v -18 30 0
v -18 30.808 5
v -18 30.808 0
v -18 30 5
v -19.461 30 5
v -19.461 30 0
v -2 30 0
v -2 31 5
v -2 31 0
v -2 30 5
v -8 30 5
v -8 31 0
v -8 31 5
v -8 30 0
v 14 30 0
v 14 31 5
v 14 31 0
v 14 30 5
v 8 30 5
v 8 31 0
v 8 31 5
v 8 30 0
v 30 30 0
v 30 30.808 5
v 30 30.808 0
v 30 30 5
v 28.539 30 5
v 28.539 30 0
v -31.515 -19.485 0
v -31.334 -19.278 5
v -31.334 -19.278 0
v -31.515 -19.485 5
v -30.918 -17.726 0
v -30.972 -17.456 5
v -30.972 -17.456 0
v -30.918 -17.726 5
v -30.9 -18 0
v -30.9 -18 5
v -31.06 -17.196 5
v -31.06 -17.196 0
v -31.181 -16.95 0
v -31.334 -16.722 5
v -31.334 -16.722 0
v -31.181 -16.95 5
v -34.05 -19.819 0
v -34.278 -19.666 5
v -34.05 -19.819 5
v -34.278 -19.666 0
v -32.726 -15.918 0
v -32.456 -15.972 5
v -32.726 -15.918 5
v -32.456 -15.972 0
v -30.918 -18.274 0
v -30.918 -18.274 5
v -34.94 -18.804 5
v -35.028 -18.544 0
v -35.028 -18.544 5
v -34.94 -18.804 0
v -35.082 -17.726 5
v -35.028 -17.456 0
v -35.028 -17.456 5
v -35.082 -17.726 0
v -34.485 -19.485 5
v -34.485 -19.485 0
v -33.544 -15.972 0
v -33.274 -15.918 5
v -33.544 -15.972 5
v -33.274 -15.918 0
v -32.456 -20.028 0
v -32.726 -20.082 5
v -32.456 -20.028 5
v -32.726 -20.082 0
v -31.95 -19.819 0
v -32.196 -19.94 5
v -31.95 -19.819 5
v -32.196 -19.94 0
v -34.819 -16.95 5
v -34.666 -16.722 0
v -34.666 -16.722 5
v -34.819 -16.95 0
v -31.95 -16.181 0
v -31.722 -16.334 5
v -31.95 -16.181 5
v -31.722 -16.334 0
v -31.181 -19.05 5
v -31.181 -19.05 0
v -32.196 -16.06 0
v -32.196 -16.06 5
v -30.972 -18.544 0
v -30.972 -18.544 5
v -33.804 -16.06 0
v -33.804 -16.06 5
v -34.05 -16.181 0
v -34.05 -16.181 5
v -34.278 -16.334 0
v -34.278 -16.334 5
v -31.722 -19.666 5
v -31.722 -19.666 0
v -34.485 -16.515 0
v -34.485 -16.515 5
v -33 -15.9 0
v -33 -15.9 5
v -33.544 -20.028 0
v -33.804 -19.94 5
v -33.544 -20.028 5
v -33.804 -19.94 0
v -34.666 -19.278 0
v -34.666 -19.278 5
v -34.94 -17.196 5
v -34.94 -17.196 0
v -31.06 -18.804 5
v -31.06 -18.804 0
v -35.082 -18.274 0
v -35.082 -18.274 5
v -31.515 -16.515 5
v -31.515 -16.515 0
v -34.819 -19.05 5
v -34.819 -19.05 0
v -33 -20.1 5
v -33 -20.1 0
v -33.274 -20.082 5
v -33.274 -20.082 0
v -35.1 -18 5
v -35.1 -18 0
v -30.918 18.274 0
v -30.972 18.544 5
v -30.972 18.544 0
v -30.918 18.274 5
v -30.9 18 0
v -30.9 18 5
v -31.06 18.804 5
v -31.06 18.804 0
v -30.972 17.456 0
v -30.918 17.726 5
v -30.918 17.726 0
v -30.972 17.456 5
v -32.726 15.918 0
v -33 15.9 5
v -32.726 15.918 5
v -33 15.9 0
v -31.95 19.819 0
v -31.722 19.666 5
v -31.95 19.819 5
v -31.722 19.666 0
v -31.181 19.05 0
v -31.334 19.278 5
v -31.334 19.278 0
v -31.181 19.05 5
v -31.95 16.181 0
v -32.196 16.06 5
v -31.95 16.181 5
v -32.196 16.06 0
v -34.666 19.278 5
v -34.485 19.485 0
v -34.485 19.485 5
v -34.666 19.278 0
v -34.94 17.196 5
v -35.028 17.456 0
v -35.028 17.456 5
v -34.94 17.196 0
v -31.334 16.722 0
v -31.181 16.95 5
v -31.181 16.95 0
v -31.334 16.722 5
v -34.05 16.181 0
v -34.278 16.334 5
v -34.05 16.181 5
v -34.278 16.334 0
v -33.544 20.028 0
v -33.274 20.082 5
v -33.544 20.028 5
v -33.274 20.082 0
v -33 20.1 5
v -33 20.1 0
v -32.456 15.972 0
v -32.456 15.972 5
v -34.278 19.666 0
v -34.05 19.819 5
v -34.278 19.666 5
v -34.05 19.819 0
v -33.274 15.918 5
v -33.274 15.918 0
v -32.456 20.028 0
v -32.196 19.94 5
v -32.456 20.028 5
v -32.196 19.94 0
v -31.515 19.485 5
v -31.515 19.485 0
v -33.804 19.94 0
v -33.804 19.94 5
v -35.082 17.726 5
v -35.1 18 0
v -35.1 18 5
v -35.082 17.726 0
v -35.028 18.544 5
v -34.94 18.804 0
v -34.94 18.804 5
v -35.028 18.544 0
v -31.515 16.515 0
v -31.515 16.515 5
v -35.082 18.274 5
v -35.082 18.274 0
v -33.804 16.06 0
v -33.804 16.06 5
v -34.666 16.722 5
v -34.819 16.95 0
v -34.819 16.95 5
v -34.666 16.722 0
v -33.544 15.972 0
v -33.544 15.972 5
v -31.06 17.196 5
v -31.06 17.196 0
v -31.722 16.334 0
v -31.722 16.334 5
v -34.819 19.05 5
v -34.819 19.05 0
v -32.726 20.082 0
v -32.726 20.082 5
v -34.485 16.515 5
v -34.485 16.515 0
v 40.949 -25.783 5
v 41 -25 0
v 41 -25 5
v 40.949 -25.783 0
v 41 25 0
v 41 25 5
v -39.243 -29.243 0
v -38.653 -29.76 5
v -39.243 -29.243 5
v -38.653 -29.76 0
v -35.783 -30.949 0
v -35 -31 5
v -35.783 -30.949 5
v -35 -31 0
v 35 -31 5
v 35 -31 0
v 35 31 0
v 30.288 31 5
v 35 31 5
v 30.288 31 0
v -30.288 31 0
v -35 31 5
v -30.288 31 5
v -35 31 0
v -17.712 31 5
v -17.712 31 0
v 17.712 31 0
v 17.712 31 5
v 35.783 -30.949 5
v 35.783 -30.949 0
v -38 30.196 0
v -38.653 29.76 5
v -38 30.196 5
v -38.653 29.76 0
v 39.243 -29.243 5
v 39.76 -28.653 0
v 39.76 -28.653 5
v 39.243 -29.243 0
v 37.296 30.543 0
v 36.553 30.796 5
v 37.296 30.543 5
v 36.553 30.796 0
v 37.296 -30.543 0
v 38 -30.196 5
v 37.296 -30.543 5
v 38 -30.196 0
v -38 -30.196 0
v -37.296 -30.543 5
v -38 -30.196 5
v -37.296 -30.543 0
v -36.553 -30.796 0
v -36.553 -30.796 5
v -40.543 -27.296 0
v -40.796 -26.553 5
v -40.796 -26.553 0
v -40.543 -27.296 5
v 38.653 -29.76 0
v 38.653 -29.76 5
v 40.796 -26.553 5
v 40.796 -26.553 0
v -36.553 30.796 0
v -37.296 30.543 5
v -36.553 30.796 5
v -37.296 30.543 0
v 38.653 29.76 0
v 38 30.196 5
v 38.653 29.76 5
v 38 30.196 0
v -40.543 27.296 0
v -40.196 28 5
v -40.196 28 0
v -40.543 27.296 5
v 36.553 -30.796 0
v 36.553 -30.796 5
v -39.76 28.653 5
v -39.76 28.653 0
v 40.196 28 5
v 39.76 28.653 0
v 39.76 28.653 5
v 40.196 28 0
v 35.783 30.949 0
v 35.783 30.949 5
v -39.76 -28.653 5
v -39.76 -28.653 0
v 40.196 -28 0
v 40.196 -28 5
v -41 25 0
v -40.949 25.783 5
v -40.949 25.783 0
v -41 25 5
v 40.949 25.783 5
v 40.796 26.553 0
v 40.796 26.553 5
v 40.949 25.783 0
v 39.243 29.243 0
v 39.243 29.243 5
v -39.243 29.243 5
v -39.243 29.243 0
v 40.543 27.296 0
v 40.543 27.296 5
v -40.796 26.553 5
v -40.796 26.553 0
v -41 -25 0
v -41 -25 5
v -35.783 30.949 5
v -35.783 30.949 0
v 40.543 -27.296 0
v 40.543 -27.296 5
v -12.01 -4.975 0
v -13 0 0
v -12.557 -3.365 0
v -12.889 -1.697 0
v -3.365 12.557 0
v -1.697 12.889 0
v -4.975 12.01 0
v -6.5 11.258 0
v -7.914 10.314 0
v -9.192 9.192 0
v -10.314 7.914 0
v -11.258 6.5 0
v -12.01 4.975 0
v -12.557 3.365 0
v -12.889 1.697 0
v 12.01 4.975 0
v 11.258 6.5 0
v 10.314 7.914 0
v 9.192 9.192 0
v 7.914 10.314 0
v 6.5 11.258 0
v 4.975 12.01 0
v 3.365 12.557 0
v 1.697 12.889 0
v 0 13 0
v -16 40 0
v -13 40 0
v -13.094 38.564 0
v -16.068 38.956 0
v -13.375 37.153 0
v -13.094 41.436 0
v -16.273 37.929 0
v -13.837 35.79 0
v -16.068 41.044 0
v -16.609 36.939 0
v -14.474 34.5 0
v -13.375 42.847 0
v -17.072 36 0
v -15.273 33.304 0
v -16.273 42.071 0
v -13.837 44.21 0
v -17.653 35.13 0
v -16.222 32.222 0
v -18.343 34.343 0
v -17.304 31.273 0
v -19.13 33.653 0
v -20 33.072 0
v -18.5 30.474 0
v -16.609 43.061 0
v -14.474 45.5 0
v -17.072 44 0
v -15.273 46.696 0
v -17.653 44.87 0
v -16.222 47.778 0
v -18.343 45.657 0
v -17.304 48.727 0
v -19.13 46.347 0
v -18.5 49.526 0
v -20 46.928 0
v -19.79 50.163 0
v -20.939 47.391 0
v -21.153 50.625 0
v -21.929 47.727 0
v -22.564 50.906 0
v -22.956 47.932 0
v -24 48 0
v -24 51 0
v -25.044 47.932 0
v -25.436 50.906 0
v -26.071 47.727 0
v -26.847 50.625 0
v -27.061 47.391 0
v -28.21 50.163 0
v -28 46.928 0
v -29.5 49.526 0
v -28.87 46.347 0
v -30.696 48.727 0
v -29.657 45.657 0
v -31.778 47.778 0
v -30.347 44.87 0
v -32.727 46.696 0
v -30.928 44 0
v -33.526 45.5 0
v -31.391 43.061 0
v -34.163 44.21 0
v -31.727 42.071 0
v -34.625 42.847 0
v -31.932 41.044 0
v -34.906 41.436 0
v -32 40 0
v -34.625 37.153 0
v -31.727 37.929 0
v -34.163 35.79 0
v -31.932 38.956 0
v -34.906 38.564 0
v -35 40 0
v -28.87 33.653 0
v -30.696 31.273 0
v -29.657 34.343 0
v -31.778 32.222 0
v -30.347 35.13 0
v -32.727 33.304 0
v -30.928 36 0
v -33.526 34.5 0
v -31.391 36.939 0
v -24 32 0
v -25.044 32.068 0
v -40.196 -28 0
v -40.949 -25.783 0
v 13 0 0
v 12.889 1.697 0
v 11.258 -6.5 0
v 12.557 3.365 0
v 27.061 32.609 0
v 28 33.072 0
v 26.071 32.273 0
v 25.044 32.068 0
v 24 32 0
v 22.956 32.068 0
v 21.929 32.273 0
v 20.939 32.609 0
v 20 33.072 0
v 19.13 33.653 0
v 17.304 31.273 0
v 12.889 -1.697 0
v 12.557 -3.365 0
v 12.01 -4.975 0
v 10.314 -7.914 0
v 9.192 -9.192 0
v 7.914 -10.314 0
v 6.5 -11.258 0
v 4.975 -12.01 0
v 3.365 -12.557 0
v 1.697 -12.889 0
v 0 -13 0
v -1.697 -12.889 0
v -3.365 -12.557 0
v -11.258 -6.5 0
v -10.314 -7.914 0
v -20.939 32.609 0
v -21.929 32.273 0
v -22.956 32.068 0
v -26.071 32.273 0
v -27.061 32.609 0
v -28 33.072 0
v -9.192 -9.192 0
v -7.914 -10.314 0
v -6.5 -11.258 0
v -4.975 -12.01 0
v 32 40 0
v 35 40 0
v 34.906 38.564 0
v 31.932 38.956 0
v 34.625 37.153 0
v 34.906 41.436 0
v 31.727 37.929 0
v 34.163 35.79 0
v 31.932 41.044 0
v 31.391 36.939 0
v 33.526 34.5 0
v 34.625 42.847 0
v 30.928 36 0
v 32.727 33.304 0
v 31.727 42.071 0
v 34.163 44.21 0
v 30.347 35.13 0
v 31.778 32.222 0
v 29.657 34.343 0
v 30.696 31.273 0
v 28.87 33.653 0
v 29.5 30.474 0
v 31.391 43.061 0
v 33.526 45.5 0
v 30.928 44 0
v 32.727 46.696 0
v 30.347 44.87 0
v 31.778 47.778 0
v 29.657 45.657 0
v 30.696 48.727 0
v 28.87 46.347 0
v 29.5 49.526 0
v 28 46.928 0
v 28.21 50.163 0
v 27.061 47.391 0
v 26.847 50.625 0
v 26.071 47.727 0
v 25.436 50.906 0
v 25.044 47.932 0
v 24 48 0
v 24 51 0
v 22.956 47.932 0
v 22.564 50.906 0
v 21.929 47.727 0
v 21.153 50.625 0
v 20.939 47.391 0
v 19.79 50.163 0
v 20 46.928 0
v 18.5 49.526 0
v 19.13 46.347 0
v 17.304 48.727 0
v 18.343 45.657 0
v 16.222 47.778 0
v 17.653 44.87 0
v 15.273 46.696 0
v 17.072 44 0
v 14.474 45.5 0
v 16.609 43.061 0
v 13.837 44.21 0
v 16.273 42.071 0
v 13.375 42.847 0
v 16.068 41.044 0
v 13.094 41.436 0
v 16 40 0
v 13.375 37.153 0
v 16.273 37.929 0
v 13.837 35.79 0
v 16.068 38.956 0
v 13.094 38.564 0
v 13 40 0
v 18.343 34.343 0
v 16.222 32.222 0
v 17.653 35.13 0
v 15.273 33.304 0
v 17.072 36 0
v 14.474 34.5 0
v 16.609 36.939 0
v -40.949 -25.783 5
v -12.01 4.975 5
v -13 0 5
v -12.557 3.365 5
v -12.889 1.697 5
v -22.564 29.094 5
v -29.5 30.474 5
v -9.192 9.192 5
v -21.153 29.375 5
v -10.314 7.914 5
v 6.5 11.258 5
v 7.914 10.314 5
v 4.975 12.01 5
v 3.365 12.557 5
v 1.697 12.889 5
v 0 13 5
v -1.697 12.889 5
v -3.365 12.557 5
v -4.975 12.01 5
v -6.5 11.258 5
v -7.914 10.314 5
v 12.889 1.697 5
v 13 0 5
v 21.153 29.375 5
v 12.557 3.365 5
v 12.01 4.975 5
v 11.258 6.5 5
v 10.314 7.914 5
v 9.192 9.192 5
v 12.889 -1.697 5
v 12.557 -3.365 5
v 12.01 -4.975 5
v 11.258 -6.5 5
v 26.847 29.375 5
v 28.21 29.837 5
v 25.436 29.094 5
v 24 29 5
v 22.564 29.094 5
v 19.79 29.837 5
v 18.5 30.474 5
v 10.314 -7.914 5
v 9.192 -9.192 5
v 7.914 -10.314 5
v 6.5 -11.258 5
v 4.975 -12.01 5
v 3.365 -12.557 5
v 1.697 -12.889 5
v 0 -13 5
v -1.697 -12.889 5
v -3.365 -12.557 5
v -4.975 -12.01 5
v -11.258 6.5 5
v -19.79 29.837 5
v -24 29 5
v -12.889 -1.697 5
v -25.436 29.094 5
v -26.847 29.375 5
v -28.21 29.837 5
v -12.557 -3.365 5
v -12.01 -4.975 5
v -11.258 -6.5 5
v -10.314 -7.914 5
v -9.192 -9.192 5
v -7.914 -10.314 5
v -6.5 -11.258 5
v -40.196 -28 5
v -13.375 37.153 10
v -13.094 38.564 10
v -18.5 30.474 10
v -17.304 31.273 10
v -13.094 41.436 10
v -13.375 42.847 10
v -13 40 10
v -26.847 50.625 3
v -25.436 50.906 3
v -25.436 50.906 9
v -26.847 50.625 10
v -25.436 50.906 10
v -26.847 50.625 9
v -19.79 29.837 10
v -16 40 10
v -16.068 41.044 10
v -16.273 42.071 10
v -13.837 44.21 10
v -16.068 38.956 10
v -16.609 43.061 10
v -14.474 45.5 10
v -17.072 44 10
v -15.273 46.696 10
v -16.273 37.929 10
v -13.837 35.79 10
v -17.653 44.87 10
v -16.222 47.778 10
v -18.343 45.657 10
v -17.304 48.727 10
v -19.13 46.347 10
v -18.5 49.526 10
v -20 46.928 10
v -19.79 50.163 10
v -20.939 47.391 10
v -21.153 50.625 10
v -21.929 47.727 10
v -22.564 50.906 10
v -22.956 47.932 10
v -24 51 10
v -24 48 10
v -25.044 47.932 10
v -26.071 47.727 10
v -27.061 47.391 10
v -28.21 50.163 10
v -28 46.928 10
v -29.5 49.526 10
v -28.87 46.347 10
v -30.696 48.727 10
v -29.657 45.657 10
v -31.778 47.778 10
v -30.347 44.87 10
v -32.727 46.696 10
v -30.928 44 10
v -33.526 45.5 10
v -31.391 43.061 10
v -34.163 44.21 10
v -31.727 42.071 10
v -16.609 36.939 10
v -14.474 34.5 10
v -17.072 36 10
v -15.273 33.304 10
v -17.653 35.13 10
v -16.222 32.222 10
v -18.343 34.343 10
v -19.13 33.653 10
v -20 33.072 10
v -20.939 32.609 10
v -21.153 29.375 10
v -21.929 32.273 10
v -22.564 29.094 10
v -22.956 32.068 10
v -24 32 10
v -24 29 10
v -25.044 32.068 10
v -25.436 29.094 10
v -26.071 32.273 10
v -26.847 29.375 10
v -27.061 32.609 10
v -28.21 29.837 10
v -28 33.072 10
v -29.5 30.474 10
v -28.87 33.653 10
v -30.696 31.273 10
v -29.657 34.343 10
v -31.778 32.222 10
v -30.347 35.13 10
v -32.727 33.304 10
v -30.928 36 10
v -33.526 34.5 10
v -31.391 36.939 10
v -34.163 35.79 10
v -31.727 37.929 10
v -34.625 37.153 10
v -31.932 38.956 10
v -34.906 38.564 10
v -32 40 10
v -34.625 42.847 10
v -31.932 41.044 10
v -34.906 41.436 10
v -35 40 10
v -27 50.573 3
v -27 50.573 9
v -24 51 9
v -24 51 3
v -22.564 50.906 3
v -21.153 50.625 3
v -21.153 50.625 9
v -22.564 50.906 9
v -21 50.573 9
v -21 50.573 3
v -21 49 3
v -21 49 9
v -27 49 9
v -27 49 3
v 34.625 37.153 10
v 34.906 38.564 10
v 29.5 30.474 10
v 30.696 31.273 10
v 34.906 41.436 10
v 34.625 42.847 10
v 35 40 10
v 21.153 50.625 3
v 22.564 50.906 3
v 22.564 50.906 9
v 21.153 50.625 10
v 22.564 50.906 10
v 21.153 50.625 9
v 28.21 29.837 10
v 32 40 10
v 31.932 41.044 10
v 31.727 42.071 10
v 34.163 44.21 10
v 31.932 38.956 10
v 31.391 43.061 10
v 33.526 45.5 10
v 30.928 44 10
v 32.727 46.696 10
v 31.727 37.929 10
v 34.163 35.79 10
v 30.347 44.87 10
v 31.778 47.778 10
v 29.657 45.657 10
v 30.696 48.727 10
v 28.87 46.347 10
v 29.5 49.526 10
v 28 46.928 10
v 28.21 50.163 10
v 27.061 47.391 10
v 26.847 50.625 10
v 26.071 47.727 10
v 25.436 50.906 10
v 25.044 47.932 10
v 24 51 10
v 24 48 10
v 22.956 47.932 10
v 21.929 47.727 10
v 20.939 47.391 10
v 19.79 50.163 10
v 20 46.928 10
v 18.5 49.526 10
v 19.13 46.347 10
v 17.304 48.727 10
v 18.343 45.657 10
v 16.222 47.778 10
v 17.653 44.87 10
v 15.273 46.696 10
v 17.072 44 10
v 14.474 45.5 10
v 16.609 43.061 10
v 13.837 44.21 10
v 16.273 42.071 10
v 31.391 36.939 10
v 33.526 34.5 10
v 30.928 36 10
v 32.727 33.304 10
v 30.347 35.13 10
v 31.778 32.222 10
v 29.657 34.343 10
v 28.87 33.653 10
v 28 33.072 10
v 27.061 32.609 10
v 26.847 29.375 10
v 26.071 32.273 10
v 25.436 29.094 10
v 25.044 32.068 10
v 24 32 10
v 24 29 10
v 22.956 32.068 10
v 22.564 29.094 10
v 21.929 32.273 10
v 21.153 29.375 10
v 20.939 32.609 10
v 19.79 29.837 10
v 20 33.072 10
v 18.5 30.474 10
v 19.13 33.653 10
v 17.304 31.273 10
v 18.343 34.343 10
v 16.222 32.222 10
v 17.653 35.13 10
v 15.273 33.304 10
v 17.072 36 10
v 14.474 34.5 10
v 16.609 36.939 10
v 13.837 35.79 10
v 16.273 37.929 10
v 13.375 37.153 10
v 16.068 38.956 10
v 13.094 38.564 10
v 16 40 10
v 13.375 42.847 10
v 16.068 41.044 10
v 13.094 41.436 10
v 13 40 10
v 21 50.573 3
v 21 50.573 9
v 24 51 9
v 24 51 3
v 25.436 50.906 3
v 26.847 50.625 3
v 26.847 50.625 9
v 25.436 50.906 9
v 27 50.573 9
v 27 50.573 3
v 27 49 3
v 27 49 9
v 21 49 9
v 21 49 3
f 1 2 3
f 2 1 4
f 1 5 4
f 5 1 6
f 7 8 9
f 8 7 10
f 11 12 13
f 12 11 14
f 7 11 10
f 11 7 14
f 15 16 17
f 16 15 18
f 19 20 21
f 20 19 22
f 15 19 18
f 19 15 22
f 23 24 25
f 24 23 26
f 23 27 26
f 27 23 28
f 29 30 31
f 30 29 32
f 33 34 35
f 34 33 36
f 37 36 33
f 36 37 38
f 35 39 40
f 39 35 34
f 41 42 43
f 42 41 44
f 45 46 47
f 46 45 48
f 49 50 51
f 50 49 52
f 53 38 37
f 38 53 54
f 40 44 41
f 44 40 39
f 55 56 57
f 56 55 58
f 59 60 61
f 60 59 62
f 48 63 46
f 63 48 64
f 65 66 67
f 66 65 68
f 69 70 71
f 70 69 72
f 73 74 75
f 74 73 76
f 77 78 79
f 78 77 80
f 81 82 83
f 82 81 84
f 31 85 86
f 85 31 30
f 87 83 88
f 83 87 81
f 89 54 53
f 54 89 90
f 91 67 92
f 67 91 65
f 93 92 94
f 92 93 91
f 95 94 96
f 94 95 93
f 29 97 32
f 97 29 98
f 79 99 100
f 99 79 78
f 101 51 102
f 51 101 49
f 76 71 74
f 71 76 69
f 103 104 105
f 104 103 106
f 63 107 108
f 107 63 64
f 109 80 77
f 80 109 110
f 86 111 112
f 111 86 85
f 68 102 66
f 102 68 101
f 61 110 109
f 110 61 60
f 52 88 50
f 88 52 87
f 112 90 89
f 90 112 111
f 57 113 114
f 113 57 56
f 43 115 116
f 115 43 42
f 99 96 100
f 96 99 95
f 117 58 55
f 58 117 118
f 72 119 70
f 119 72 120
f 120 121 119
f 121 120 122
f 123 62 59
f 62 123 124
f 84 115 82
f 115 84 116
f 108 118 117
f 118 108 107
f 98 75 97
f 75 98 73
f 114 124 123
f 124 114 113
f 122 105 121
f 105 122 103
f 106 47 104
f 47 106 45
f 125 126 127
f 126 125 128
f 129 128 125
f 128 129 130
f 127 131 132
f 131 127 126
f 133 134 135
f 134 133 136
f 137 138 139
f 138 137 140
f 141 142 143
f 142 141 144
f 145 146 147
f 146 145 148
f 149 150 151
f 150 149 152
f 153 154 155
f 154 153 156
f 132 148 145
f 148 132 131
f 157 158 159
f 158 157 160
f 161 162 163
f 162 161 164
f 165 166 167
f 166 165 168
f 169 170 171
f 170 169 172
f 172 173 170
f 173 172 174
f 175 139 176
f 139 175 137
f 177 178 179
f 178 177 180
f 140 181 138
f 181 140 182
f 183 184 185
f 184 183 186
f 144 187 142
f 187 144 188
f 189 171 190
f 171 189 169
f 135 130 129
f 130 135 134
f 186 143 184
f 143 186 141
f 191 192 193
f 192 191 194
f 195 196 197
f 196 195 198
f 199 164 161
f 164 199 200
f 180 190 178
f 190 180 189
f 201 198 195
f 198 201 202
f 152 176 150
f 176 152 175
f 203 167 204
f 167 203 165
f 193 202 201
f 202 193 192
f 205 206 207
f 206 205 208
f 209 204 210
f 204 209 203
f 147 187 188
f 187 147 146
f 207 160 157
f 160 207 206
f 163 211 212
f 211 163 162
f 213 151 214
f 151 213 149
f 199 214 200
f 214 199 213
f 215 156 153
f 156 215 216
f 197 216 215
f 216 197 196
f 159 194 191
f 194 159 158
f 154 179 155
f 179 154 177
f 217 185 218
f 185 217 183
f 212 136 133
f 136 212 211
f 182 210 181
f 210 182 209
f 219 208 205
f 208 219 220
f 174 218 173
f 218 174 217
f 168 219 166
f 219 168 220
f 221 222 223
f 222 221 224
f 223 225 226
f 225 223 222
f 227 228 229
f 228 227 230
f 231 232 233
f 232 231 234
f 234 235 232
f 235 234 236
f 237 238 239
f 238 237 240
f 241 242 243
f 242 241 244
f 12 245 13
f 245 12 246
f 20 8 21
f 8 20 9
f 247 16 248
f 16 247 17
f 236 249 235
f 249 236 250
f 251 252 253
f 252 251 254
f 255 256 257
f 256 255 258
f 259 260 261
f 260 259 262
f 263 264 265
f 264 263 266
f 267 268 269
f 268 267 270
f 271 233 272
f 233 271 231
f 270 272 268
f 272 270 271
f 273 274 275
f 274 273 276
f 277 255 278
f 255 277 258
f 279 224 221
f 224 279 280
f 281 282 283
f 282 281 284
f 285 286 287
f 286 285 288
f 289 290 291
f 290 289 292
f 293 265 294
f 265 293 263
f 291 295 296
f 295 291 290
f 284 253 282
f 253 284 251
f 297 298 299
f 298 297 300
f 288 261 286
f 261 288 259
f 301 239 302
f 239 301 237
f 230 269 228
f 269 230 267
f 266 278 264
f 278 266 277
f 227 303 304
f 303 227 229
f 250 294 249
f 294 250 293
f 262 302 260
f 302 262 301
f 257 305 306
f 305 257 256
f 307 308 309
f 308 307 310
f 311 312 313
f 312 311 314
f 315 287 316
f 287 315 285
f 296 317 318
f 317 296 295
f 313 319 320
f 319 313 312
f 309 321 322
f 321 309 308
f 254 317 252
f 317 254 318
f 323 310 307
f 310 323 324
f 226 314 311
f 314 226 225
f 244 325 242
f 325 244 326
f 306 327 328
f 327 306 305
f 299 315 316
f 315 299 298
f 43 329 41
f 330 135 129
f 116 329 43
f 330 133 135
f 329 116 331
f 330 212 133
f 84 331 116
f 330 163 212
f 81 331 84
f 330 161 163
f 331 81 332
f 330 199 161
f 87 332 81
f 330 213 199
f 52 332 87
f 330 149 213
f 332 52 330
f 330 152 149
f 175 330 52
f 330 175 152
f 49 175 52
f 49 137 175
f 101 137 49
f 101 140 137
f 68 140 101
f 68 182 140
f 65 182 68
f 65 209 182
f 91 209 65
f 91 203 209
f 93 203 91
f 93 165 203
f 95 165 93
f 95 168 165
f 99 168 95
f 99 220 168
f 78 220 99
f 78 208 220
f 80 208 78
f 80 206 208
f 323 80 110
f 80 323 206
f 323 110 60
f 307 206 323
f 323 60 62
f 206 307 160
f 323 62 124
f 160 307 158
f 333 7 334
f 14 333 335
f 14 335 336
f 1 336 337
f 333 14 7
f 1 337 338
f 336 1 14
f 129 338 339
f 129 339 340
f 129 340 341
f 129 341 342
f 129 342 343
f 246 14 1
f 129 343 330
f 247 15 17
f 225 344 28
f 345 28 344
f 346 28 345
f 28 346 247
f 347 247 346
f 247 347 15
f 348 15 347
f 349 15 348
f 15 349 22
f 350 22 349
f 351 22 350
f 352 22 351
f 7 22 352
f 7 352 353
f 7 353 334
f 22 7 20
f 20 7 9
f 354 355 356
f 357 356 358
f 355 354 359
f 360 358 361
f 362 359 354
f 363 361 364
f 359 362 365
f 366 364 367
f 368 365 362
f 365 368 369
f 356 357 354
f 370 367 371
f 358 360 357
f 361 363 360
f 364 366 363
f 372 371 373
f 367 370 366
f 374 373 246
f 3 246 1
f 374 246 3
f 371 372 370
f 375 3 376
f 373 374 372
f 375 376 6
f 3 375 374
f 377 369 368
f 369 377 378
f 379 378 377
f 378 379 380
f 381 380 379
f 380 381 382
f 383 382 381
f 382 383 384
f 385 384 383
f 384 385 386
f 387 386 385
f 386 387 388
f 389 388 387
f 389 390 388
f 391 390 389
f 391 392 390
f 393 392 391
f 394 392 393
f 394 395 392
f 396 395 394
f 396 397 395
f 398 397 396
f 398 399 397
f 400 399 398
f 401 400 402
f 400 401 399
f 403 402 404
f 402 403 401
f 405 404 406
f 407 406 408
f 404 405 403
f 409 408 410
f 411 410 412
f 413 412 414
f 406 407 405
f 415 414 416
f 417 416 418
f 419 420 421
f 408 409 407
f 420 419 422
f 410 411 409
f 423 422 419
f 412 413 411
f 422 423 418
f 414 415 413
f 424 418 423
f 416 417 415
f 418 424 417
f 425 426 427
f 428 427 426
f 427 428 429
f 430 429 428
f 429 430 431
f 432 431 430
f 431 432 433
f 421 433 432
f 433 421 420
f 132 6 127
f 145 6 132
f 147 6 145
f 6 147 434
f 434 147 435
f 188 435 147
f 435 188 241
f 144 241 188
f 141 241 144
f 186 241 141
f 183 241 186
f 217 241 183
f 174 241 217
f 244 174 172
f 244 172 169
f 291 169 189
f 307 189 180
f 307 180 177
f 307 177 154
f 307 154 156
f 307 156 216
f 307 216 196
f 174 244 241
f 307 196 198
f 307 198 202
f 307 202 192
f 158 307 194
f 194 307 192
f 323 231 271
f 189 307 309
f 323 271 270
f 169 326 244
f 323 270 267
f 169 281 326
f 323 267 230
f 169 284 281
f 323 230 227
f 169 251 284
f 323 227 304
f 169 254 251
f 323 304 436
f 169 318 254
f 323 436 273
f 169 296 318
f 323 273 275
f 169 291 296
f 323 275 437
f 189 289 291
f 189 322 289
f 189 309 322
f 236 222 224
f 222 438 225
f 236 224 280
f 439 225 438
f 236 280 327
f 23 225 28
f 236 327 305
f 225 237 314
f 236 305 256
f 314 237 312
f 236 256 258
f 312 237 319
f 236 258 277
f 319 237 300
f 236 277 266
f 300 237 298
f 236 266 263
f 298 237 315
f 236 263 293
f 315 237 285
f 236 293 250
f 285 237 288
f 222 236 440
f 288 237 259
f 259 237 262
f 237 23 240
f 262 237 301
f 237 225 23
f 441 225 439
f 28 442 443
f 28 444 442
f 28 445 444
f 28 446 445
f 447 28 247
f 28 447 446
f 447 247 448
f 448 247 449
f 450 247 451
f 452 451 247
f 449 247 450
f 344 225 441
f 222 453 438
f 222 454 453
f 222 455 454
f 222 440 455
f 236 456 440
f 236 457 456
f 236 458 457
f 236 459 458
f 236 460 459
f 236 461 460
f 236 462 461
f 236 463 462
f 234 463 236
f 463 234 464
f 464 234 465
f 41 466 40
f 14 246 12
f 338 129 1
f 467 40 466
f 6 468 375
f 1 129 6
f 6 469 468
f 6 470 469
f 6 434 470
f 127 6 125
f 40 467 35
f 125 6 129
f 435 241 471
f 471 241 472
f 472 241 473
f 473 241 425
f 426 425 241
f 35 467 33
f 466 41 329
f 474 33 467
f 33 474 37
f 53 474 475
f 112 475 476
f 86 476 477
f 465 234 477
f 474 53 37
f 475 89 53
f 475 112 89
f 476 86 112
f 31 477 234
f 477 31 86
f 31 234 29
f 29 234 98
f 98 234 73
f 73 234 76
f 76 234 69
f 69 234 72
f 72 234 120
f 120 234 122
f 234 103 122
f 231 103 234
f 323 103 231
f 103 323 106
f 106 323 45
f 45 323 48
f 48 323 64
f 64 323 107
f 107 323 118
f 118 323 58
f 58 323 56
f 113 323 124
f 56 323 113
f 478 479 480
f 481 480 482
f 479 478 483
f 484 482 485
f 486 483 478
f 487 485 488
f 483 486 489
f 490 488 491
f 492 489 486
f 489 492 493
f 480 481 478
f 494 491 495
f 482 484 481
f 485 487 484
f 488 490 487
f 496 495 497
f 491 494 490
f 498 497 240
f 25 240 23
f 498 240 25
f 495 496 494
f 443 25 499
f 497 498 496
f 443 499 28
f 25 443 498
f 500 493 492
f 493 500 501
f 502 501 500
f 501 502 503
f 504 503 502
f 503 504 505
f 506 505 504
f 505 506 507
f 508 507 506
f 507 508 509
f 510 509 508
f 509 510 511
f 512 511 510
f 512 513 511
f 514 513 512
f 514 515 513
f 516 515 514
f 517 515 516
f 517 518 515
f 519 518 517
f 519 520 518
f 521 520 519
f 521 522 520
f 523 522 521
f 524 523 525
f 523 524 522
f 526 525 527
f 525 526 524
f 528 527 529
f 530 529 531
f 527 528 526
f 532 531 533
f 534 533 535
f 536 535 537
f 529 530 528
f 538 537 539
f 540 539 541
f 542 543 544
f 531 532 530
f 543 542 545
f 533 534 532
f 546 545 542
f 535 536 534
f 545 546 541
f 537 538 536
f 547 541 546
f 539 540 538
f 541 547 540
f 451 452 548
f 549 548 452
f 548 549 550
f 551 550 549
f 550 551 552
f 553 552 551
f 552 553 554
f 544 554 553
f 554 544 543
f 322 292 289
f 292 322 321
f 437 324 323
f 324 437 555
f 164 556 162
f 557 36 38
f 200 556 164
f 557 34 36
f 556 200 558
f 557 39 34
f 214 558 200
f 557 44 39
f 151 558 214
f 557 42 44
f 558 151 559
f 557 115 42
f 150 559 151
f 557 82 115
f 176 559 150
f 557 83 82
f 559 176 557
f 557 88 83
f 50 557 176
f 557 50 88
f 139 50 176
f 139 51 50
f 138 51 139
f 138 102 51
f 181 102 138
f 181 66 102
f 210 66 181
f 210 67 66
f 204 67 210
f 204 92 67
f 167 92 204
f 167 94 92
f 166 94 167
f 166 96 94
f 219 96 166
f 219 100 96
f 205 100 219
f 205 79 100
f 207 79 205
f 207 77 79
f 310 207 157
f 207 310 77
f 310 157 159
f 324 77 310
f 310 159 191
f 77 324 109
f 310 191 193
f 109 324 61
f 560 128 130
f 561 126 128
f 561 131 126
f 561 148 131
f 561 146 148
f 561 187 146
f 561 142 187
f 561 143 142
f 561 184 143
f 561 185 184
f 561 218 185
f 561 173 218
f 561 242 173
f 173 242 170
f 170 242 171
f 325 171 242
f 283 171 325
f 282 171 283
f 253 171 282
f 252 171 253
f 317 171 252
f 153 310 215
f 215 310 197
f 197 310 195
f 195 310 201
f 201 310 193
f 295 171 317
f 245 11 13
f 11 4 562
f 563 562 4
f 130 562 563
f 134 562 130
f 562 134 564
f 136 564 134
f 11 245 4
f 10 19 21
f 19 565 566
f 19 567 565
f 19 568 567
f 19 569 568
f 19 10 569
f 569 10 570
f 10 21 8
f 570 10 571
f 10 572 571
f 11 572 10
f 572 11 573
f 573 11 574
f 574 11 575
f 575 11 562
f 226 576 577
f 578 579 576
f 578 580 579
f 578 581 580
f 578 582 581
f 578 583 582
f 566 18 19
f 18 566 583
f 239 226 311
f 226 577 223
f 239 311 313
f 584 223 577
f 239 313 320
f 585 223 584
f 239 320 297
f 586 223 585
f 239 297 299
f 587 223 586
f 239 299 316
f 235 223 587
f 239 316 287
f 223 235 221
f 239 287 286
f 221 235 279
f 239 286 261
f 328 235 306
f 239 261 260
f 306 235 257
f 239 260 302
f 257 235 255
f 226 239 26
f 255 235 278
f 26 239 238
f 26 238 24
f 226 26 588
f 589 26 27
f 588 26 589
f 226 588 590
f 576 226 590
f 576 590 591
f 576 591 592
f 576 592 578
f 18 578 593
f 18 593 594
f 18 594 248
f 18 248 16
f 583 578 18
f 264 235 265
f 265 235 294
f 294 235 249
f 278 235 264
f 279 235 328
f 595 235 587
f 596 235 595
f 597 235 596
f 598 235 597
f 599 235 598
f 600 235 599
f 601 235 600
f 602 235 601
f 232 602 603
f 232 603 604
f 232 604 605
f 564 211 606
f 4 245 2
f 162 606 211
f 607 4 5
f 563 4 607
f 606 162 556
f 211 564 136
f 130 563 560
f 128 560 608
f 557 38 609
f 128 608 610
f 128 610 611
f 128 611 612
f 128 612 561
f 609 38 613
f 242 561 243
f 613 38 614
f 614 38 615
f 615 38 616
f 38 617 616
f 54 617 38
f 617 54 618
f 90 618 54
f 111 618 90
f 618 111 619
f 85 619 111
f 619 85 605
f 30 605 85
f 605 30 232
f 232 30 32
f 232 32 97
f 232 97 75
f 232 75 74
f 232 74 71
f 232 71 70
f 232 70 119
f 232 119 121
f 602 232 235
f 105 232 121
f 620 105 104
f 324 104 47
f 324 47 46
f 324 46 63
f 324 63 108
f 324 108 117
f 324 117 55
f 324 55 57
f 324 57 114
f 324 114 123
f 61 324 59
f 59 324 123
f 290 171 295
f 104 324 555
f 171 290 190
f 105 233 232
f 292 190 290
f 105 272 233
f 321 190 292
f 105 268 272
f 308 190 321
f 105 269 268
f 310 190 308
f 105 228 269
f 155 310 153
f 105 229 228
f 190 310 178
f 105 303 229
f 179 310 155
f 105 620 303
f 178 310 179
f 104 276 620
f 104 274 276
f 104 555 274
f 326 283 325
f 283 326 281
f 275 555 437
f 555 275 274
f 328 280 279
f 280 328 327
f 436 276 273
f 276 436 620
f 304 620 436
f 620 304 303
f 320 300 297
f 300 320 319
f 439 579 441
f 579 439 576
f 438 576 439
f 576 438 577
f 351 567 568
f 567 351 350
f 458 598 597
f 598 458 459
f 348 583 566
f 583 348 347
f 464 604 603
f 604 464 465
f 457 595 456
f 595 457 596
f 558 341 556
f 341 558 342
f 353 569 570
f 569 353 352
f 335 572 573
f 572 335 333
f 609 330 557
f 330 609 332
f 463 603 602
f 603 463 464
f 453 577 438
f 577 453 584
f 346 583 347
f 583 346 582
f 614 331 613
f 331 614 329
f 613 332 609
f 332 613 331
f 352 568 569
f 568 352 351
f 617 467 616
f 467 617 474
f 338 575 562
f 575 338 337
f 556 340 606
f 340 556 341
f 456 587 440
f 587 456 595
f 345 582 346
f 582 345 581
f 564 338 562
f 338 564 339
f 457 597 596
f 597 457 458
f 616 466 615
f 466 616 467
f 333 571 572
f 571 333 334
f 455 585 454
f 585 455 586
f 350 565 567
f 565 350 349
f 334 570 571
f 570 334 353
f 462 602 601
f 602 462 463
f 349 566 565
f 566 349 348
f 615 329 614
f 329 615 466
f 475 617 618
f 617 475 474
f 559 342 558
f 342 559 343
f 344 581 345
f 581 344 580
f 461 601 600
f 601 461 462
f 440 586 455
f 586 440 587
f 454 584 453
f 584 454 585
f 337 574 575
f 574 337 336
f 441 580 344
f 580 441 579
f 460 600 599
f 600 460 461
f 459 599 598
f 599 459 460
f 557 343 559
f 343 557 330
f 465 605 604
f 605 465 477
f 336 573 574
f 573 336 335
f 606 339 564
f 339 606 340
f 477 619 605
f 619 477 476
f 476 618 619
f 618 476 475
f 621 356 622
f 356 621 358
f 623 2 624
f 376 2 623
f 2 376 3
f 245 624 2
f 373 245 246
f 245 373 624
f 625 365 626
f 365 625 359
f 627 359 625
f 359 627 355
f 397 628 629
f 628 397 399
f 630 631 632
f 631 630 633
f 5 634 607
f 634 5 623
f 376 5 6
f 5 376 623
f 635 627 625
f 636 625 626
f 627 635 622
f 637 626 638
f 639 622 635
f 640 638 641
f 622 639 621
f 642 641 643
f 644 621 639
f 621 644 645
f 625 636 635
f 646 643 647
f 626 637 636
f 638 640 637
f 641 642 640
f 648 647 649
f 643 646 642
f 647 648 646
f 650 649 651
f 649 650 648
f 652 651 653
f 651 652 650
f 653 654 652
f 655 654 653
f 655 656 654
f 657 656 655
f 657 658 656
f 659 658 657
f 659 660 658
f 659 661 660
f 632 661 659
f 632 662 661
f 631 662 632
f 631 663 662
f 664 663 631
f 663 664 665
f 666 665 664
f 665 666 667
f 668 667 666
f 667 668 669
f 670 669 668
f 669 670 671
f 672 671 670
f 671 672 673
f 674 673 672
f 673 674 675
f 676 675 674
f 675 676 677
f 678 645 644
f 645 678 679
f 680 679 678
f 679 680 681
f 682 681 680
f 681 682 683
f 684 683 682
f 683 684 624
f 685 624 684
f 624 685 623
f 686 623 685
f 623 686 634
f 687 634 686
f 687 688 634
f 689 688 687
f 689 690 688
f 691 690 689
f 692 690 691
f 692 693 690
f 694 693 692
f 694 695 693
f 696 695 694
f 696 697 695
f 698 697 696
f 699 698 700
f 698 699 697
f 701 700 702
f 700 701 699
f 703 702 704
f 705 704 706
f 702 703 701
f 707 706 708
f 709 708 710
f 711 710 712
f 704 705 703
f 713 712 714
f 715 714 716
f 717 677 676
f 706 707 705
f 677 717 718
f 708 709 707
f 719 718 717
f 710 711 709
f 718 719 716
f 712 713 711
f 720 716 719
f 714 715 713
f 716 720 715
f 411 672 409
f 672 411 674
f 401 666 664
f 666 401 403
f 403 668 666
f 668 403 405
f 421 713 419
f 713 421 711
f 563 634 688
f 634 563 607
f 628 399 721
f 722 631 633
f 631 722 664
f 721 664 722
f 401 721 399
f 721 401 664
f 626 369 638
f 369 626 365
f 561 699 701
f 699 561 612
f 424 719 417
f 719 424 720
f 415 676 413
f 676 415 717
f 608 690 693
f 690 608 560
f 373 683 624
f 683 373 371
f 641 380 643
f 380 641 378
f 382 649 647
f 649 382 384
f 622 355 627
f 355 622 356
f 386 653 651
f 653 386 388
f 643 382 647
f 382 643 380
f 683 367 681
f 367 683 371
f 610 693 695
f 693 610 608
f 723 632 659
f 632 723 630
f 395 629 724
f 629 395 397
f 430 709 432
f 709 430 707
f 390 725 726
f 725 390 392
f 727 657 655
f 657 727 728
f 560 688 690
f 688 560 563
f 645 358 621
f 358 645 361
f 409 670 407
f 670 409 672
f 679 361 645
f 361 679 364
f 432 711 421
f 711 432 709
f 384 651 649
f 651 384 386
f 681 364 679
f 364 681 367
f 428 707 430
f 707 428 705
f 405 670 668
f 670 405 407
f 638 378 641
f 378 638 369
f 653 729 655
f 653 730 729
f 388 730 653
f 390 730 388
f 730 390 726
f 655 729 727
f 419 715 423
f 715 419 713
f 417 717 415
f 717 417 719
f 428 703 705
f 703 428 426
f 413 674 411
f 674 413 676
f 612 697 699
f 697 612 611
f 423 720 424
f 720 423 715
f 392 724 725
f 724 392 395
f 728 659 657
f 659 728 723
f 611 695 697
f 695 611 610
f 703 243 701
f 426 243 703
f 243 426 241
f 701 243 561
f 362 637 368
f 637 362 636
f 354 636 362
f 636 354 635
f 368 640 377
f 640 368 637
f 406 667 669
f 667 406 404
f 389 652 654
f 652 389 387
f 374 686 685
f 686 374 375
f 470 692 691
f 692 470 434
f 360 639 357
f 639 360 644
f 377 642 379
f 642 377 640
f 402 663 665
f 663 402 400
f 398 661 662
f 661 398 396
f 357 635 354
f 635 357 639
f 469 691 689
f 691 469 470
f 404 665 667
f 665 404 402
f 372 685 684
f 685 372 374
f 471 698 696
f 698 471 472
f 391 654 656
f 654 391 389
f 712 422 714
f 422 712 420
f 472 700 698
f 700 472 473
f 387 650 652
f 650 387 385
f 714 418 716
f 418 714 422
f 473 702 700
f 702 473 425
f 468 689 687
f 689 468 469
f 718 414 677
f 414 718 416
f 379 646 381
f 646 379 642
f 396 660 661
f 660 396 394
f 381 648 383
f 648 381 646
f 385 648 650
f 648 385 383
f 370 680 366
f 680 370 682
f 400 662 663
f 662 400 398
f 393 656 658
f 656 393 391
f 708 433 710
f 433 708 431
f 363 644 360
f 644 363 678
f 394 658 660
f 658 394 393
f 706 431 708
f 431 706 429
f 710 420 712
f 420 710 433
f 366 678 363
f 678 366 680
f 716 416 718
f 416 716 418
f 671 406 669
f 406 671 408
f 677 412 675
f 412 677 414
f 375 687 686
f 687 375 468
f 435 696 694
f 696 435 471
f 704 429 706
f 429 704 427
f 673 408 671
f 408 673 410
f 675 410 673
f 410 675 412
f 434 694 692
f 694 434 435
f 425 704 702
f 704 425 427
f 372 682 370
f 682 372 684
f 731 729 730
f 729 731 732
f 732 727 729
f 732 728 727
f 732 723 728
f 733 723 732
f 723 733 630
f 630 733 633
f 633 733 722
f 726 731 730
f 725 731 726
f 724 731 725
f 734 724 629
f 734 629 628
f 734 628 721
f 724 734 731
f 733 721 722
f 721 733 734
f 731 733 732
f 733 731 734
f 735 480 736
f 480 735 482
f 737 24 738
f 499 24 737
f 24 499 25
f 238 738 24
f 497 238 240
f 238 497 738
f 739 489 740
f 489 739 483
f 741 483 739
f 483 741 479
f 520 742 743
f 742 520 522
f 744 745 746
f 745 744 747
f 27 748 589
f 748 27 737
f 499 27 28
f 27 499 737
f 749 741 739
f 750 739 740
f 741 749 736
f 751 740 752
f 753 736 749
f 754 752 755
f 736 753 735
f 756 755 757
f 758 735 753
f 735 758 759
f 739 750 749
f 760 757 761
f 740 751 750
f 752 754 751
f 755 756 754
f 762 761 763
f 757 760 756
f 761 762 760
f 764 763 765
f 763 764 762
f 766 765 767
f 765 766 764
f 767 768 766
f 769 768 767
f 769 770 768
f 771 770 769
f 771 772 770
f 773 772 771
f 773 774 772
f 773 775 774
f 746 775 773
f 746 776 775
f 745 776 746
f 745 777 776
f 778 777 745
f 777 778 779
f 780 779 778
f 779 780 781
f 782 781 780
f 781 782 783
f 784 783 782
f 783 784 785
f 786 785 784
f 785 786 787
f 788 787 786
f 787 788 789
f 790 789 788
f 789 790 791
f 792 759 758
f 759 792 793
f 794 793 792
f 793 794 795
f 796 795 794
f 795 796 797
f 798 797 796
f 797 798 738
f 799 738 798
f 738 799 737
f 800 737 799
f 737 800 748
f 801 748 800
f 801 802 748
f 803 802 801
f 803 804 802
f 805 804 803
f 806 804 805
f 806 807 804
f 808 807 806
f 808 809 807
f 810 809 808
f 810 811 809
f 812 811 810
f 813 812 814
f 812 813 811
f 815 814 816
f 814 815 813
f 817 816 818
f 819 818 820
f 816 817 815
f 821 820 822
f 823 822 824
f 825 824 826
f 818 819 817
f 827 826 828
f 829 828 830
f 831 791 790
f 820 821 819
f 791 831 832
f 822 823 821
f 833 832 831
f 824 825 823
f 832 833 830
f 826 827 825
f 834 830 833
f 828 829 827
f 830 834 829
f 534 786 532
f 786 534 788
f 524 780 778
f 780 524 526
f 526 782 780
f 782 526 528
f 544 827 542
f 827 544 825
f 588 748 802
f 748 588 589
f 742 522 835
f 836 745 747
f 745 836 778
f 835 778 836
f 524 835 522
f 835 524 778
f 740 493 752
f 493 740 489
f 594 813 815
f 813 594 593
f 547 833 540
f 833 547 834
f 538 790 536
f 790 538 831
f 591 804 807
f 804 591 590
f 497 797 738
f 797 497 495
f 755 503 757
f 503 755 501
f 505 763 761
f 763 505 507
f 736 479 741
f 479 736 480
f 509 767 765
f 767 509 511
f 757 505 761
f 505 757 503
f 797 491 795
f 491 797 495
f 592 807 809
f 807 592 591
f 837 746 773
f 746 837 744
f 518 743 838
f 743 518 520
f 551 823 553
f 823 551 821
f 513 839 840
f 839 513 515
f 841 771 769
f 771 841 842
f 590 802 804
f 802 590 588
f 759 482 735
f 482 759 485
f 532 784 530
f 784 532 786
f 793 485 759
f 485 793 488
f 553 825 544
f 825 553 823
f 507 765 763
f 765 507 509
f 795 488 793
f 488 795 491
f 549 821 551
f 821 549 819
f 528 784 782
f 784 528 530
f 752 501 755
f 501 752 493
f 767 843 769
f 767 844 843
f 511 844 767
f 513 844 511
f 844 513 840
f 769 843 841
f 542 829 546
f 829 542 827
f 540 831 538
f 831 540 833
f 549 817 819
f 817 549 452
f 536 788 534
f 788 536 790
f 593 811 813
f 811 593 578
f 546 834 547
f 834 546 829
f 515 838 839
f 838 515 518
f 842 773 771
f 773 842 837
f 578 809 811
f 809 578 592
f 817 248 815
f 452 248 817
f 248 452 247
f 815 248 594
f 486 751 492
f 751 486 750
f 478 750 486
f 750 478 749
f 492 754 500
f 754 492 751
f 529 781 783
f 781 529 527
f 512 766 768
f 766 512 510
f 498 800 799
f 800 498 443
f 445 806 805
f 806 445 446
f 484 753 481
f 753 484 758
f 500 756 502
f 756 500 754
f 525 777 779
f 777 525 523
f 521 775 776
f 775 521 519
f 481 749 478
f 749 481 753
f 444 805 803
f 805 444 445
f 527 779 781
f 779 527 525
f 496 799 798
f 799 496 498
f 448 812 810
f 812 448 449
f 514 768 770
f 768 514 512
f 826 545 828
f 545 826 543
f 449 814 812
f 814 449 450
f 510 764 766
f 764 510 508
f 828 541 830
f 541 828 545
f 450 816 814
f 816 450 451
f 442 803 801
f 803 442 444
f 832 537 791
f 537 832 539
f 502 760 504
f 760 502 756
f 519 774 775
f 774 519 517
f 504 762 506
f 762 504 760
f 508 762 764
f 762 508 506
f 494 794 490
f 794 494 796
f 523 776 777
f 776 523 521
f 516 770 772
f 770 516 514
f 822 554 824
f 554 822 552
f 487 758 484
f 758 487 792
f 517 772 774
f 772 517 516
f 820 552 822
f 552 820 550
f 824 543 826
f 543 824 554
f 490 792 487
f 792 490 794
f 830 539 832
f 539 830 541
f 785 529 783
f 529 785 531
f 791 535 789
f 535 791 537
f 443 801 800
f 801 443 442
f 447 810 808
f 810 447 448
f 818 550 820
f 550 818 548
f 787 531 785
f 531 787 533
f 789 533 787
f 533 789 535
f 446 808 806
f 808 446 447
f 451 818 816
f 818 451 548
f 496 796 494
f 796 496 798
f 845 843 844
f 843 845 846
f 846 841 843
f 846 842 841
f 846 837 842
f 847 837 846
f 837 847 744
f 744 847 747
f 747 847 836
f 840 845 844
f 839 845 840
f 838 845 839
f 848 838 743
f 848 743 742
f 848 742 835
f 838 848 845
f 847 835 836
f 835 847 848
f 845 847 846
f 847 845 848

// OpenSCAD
// КИСТЬ-М: пястный сегмент каркаса (фрагмент 3D-модели, печать ПЭТГ)
$fn = 48;

module palm_plate() {
  difference() {
    // основа по ладони
    translate([-35, -25, 0]) minkowski() {
      cube([70, 50, 4]);
      cylinder(r = 6, h = 1);
    }
    // окно под барабан привода
    translate([0, 0, -1]) cylinder(d = 26, h = 8);
    // пазы тяг к пальцам
    for (x = [-24, -8, 8, 24])
      translate([x, 30, -1]) cube([6, 16, 8]);
    // крепёж манжеты
    for (y = [-18, 18])
      translate([-33, y, -1]) cylinder(d = 4.2, h = 8);
  }
}

module finger_ring() {
  difference() {
    cylinder(d = 22, h = 10);
    translate([0, 0, -1]) cylinder(d = 16, h = 12);
    translate([-3, 9, 3]) cube([6, 6, 6]);   // замок тяги
  }
}

palm_plate();
translate([-24, 40, 0]) finger_ring();
translate([24, 40, 0]) finger_ring();
// Итог: масса печати сегмента 61 г; суммарная масса аппарата 780 г.
